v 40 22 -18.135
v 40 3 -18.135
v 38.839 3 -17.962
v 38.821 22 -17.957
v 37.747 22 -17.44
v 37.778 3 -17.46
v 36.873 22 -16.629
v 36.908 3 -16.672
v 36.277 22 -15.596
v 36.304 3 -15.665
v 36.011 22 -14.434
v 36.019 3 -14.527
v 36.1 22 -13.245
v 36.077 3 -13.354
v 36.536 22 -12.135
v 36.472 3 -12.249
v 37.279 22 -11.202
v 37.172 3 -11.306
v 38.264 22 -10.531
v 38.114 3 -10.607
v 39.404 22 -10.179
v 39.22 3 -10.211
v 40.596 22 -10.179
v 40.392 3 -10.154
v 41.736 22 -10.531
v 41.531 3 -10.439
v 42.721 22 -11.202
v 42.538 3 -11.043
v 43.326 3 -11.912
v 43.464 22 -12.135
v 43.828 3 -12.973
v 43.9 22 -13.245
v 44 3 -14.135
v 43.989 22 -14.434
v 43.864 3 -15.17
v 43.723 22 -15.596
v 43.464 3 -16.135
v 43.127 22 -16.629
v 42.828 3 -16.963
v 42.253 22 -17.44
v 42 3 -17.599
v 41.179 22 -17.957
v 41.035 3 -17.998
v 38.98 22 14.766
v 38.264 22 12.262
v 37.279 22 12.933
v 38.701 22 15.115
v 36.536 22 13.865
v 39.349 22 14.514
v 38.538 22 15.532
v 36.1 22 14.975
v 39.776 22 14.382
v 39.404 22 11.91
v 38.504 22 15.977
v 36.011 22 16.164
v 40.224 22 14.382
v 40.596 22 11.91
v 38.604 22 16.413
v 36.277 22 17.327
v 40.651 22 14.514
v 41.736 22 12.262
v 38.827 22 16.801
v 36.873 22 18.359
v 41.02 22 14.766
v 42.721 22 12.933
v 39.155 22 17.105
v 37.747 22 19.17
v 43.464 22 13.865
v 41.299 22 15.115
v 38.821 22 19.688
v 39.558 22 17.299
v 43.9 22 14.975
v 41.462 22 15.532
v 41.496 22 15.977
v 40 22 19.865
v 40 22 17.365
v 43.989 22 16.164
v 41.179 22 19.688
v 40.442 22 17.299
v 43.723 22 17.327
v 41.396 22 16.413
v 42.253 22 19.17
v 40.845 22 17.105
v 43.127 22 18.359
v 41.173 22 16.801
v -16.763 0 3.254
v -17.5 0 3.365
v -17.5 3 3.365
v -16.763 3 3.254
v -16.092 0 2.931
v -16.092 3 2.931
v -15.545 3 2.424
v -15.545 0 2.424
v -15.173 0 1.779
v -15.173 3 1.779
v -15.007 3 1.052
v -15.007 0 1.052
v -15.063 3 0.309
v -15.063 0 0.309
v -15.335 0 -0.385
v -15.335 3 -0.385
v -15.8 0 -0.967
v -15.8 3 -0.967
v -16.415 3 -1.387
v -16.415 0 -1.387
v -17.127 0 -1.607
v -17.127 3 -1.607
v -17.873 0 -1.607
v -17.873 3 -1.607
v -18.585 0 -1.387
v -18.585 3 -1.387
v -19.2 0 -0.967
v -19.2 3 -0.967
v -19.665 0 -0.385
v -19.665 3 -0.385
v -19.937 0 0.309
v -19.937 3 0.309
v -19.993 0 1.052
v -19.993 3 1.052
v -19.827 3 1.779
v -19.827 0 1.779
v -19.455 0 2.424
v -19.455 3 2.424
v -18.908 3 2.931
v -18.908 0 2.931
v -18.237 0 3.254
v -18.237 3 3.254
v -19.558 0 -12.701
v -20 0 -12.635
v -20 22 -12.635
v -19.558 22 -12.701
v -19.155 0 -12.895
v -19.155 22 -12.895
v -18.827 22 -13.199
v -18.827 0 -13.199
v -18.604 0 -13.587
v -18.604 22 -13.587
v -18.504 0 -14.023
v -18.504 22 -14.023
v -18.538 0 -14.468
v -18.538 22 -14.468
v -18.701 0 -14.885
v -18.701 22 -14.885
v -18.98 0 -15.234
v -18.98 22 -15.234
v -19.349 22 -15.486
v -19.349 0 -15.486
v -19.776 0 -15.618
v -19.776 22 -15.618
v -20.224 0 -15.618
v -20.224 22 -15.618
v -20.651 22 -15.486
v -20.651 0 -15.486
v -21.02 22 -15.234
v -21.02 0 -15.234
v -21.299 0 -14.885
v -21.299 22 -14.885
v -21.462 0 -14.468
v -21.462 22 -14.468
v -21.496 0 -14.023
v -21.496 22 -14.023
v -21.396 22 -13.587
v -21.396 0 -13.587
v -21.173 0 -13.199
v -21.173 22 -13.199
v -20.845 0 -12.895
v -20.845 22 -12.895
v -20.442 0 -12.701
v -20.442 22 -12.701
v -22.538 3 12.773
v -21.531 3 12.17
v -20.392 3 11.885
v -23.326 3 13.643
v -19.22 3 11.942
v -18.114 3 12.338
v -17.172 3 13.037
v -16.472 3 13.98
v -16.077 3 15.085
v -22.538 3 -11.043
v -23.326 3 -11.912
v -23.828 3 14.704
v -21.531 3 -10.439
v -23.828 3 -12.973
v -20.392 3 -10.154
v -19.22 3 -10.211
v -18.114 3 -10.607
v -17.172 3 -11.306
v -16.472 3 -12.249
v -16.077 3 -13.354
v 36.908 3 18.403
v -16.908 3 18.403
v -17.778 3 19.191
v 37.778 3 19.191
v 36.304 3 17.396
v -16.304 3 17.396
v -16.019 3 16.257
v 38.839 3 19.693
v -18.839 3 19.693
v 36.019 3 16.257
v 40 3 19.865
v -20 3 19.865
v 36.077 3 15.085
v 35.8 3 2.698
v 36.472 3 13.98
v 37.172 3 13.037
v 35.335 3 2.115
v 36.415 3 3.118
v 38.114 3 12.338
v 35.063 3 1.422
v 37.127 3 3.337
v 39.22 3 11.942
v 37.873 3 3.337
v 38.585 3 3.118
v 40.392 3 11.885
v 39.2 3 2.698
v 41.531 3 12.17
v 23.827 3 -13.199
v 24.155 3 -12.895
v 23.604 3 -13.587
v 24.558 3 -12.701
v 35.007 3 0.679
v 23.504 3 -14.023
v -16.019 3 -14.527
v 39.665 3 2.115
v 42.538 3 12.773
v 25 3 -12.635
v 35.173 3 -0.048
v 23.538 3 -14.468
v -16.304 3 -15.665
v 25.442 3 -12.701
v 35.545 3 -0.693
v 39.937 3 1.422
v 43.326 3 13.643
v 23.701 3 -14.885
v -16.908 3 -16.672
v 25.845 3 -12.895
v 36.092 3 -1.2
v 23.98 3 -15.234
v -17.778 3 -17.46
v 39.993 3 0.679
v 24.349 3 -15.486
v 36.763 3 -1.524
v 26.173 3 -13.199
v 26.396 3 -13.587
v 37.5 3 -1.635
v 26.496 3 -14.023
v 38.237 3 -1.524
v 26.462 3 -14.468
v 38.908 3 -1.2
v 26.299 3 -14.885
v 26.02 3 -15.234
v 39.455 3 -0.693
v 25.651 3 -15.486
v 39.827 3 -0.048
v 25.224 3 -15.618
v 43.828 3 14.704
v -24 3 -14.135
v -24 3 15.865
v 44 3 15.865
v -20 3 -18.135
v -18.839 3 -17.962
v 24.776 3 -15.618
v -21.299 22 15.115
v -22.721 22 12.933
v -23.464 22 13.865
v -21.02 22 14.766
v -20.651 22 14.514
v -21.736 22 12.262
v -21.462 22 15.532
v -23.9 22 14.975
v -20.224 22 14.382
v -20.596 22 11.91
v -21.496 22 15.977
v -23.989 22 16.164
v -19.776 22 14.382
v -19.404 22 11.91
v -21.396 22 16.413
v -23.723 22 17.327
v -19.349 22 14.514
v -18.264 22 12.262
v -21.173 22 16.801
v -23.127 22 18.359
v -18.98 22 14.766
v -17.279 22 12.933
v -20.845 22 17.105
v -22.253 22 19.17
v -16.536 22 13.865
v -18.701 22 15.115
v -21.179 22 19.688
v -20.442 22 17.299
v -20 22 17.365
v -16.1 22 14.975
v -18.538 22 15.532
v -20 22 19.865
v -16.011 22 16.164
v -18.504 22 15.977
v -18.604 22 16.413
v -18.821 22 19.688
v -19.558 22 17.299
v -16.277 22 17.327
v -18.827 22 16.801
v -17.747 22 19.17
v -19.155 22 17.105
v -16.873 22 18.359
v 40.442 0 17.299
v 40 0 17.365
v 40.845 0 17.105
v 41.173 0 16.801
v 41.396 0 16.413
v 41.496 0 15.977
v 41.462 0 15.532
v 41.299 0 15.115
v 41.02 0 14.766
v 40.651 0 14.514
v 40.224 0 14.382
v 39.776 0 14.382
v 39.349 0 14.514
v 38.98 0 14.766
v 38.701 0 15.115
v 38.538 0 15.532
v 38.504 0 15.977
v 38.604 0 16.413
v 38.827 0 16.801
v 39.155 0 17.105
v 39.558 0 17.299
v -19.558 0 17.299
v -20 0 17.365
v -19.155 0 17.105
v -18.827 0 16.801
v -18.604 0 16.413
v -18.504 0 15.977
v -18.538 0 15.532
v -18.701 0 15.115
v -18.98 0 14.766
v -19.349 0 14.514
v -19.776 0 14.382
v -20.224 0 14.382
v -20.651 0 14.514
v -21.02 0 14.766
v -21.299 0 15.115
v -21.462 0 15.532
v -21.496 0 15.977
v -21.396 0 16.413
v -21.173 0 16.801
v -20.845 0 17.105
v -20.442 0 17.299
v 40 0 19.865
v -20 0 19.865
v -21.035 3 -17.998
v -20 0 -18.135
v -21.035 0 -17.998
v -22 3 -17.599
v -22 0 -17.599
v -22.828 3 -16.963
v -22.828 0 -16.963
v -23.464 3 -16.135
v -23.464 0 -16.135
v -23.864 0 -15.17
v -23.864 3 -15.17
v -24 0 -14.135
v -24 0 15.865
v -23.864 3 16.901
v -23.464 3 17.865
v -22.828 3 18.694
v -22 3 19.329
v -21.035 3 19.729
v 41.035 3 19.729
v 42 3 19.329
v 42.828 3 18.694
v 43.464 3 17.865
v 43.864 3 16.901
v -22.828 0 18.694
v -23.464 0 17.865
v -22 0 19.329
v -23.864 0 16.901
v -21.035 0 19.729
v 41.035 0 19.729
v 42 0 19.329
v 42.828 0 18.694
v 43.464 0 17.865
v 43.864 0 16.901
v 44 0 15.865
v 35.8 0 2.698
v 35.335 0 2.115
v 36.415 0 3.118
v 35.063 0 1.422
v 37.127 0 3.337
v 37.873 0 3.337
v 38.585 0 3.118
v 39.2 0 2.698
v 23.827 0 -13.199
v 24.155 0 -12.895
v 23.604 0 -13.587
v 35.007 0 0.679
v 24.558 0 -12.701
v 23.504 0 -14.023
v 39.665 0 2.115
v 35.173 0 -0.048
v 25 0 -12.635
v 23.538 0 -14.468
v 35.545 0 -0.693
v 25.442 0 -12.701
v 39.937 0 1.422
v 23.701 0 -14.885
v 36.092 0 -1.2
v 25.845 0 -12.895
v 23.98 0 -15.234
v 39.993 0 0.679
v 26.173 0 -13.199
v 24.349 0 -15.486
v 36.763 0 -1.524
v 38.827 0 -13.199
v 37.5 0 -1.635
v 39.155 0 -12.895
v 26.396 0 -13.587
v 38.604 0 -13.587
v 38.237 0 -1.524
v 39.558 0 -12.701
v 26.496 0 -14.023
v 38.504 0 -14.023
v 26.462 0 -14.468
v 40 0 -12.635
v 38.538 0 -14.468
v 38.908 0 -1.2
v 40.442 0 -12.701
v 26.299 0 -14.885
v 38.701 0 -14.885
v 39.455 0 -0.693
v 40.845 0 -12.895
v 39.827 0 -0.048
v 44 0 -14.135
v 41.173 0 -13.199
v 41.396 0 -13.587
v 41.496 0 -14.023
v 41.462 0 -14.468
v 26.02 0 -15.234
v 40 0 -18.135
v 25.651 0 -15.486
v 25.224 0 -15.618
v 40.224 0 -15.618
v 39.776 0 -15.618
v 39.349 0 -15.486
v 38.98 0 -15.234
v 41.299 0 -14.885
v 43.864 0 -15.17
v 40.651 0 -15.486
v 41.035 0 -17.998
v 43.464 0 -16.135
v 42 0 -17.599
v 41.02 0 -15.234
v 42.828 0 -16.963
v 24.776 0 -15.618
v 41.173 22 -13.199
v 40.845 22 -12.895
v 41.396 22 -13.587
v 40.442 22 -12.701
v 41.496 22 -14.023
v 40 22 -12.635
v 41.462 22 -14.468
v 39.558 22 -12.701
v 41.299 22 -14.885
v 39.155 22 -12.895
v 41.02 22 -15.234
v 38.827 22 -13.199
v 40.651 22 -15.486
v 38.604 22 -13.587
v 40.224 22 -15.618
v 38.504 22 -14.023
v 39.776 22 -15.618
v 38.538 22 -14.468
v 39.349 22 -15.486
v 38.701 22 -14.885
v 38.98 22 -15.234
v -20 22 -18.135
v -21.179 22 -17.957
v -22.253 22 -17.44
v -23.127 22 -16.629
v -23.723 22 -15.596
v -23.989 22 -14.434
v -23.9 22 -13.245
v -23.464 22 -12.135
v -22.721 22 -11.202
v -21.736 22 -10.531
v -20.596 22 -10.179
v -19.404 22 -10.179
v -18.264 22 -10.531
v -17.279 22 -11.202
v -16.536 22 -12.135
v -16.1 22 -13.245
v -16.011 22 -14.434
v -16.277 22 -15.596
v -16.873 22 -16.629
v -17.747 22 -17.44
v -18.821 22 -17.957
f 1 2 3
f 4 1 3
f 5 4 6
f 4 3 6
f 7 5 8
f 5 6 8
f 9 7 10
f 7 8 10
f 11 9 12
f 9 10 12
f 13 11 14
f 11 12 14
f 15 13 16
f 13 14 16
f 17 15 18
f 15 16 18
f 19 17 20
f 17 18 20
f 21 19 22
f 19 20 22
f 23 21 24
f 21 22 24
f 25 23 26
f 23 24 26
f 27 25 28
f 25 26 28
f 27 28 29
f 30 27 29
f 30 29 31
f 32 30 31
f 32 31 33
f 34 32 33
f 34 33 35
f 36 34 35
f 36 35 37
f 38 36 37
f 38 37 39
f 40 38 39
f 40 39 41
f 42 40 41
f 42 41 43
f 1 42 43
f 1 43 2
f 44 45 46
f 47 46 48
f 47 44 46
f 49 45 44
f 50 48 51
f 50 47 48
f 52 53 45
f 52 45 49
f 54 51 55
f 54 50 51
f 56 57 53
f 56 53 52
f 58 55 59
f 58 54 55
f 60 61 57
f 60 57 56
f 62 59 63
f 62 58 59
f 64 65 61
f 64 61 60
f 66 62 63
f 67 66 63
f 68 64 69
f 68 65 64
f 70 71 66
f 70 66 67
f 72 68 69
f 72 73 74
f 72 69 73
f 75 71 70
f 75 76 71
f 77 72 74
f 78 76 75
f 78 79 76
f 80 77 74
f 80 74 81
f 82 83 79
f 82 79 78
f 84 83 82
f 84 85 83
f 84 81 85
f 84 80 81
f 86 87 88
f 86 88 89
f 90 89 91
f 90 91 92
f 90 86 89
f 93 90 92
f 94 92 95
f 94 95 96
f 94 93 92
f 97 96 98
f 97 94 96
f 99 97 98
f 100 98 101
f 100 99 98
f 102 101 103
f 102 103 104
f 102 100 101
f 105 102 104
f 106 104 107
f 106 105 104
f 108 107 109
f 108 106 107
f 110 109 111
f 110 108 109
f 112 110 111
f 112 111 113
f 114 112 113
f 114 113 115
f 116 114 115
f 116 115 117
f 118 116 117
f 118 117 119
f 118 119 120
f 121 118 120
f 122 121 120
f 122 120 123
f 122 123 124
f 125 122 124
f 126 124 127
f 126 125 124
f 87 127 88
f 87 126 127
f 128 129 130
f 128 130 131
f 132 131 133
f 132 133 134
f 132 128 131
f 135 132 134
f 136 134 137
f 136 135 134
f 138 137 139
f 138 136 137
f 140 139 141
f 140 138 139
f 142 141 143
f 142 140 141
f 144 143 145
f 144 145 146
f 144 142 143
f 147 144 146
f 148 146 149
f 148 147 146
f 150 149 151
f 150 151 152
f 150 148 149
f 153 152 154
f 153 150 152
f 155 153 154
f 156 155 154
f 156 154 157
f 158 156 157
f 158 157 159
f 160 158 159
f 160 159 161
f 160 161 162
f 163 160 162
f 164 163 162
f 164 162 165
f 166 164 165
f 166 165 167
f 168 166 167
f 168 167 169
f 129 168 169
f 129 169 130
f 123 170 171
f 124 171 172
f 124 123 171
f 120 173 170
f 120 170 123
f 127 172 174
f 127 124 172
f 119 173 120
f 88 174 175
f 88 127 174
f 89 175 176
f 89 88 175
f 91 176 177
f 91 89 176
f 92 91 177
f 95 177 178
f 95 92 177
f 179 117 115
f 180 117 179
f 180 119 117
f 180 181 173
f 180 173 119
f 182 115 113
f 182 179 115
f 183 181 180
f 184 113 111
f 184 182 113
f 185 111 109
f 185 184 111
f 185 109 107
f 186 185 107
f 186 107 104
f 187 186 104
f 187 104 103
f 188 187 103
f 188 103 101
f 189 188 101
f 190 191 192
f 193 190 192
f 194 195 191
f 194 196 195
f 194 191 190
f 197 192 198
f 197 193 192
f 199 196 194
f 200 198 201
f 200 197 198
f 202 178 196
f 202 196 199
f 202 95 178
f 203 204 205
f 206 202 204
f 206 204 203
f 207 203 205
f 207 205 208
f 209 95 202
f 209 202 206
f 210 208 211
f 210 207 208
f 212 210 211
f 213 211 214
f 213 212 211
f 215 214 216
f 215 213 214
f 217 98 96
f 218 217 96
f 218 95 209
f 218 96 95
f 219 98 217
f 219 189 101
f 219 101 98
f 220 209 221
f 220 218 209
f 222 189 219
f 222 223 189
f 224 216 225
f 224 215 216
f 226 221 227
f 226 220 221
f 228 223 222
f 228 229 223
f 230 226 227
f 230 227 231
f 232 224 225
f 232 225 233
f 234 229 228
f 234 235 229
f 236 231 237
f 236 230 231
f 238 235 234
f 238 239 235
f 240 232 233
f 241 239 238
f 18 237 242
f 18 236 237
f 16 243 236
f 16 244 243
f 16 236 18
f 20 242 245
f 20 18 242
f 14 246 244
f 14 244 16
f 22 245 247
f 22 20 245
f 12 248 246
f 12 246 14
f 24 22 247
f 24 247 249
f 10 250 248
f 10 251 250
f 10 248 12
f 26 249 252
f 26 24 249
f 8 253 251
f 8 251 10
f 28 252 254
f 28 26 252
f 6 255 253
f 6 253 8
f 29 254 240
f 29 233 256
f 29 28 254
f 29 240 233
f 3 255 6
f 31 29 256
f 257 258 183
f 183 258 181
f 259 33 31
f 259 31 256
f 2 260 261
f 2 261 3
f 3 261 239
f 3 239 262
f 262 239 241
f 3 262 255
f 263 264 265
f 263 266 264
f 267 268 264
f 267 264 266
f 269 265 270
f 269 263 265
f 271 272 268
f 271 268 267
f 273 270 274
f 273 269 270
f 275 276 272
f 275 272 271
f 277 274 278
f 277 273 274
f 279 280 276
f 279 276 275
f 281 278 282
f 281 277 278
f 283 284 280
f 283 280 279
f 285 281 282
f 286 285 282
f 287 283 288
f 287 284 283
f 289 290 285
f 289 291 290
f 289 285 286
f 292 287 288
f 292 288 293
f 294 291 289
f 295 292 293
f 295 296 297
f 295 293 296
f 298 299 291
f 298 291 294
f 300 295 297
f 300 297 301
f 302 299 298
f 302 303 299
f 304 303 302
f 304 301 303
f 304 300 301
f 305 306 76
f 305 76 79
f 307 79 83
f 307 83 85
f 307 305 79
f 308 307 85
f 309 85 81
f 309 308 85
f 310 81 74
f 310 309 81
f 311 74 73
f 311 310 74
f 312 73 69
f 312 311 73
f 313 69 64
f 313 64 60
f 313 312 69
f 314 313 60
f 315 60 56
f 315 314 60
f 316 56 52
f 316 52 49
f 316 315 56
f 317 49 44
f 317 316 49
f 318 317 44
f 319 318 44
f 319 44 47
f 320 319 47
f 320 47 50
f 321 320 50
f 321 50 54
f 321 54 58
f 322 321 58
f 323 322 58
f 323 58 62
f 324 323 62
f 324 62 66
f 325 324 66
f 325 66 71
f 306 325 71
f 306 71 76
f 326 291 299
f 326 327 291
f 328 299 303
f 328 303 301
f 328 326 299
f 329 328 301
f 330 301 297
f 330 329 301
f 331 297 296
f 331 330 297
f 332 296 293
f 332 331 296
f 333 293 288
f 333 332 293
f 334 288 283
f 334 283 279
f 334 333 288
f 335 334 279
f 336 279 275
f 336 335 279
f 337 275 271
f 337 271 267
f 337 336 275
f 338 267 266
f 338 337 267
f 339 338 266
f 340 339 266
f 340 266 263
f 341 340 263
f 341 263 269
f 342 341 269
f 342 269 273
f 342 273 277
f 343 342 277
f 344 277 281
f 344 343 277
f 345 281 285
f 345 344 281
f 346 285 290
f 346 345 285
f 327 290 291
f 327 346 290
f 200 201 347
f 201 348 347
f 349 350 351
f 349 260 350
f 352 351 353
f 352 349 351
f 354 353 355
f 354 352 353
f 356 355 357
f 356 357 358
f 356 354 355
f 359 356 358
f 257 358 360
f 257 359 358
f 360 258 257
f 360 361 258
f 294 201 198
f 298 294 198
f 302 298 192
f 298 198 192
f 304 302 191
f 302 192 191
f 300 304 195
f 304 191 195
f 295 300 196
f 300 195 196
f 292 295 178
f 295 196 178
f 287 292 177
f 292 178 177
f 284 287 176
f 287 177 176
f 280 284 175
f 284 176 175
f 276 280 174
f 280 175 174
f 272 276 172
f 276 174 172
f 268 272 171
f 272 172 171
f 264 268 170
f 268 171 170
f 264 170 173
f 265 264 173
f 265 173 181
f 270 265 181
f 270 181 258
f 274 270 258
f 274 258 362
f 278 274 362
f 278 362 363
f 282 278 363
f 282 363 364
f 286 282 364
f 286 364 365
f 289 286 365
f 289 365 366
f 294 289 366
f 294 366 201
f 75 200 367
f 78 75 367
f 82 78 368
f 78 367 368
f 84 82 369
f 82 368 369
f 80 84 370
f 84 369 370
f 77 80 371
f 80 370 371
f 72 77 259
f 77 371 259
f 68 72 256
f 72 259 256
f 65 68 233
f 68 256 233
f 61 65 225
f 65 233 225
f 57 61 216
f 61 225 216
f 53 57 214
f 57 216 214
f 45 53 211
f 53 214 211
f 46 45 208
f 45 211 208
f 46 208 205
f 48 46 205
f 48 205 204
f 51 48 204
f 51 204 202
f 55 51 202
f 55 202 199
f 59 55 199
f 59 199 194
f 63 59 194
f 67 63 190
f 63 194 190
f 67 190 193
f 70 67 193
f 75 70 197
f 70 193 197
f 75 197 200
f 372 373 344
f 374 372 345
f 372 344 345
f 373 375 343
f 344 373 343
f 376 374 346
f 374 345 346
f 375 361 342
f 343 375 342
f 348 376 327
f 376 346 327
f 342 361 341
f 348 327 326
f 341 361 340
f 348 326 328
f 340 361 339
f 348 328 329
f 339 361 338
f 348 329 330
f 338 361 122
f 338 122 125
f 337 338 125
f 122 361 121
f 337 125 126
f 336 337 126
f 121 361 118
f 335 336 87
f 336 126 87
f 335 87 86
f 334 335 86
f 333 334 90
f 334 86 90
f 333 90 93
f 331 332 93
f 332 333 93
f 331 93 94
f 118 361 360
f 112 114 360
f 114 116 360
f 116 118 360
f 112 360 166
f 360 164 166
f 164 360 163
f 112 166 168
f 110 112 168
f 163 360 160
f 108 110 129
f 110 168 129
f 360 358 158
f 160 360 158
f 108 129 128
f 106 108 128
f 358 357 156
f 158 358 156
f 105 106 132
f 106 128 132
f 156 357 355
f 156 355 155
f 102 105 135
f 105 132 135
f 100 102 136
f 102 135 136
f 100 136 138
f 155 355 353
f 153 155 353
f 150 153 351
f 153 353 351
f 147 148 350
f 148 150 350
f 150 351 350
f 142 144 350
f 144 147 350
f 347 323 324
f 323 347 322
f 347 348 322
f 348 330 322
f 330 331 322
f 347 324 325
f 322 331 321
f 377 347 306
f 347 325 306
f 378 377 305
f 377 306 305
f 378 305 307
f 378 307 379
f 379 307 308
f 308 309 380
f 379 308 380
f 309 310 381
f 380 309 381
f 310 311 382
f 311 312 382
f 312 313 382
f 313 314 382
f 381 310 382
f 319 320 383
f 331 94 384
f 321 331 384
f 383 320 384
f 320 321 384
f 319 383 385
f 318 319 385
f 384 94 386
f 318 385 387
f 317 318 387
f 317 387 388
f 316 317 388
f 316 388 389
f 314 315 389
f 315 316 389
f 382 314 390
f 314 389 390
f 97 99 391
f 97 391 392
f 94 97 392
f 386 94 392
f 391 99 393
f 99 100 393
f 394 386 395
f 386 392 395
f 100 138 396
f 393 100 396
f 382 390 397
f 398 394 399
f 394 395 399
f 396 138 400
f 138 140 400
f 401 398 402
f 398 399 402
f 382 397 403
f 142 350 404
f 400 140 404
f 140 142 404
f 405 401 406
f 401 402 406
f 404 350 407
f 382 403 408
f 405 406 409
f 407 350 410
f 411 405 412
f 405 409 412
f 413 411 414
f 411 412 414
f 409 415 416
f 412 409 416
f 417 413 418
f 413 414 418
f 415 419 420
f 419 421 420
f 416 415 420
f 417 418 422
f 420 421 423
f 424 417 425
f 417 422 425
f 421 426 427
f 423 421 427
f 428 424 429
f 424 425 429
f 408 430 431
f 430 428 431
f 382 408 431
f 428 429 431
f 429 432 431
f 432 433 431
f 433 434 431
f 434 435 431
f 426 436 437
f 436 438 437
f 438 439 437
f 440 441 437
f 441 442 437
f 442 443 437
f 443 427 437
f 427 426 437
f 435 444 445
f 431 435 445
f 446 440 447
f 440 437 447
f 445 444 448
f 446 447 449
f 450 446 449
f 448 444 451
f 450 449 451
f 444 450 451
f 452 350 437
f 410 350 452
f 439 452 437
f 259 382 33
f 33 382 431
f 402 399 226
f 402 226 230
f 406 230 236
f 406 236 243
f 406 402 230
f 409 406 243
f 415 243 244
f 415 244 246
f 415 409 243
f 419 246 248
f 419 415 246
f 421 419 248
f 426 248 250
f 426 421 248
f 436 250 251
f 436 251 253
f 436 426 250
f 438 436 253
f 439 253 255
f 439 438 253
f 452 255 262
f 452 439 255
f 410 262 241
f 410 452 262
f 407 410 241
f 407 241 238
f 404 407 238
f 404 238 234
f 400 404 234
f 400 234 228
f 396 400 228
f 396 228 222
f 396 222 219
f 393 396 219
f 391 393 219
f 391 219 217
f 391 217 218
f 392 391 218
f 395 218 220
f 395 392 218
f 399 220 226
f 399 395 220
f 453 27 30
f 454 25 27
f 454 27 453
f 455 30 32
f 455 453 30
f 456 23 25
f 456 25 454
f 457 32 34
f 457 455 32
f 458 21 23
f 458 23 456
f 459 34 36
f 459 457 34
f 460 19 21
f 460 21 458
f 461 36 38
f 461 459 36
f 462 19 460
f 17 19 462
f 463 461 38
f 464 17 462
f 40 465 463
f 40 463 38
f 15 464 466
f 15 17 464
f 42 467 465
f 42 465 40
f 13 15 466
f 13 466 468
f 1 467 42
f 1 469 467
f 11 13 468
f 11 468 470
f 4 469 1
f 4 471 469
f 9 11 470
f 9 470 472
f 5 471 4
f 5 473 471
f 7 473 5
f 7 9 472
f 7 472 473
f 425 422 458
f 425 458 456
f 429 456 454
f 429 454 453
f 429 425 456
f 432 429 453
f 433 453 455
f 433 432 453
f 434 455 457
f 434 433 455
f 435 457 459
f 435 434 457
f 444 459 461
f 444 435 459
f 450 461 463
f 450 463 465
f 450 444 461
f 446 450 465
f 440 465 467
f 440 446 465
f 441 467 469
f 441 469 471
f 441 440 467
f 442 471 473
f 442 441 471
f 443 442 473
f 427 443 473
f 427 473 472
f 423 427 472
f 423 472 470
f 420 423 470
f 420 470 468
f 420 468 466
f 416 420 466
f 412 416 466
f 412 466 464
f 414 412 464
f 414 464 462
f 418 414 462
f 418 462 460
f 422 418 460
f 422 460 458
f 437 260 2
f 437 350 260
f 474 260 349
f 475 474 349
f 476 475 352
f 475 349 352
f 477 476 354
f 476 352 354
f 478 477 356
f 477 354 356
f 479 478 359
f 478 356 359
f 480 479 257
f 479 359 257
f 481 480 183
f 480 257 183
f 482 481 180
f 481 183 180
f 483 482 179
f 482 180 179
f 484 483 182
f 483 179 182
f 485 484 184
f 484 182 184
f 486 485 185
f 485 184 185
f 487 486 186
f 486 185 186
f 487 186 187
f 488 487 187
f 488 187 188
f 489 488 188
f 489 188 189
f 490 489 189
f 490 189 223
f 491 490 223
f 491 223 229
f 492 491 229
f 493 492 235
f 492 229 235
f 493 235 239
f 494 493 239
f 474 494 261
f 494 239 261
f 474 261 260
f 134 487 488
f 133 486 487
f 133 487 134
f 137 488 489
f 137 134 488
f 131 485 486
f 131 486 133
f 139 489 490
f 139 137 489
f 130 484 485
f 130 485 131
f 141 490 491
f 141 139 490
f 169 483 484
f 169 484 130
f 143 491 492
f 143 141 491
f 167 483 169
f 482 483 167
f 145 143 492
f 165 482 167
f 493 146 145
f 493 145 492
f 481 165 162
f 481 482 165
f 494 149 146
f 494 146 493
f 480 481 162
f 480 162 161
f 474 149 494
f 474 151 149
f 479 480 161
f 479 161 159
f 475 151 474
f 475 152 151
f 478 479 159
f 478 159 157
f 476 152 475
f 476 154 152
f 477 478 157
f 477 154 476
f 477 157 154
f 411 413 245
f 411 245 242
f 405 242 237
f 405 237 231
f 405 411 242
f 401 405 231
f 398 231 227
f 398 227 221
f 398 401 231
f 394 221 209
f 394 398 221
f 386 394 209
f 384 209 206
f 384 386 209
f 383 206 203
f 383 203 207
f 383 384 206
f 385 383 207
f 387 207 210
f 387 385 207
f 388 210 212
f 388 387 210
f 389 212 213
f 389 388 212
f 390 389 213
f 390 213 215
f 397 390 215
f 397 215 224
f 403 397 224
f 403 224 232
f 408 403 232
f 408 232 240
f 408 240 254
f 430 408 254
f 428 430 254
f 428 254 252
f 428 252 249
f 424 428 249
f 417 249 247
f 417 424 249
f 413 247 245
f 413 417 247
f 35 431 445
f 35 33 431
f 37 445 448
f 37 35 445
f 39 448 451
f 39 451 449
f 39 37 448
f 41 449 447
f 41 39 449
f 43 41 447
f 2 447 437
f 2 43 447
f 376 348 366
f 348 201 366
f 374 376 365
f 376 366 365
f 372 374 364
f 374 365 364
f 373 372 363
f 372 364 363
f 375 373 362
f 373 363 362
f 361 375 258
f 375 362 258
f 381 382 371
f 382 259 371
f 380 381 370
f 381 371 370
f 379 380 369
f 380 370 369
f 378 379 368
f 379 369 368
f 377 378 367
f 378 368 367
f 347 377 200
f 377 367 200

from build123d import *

# Parameters (mm, degrees)
SKETCH_1_W      = 68
SKETCH_1_H      = 38
SKETCH_1_R      = 1.5
SKETCH_1_R_2    = 2.5
EXTRUDE_1_DEPTH = 3
SKETCH_2_R      = 4
SKETCH_2_R_2    = 1.5
EXTRUDE_2_DEPTH = 19
FILLET_1_R      = 4


with BuildPart() as part:
    # 草图1 → 凸台-拉伸1 (new body)
    with BuildSketch(Plane(origin=(0, 0, 0), x_dir=(1, 0, 0), z_dir=(0, 1, 0))):
        with Locations((10, -0.865384615)):
            Rectangle(SKETCH_1_W, SKETCH_1_H)
        with Locations(Location((-20, -15.865384615, 0), (0, 0, 270))):
            Circle(SKETCH_1_R, mode=Mode.SUBTRACT)
        with Locations(Location((-20, 14.134615385, 0), (0, 0, 270))):
            Circle(SKETCH_1_R, mode=Mode.SUBTRACT)
        with Locations(Location((40, 14.134615385, 0), (0, 0, 270))):
            Circle(SKETCH_1_R, mode=Mode.SUBTRACT)
        with Locations(Location((40, -15.865384615, 0), (0, 0, 270))):
            Circle(SKETCH_1_R, mode=Mode.SUBTRACT)
        with Locations(Location((-17.5, -0.865384615, 0), (0, 0, 270))):
            Circle(SKETCH_1_R_2, mode=Mode.SUBTRACT)
        with Locations(Location((37.5, -0.865384615, 0), (0, 0, 90))):
            Circle(SKETCH_1_R_2, mode=Mode.SUBTRACT)
        with Locations(Location((25, 14.134615385, 0), (0, 0, 270))):
            Circle(SKETCH_1_R, mode=Mode.SUBTRACT)
    extrude(amount=EXTRUDE_1_DEPTH)

    # 草图2 → 凸台-拉伸2 (add)
    # profile 1 of 4: a face of its own
    with BuildSketch(Plane(origin=(0, 3, 0), x_dir=(1, 0, 0), z_dir=(0, 1, 0))):
        with Locations(Location((-20, -15.865384615, 0), (0, 0, 270))):
            Circle(SKETCH_2_R)
        with Locations(Location((-20, -15.865384615, 0), (0, 0, 270))):
            Circle(SKETCH_2_R_2, mode=Mode.SUBTRACT)
    # profile 2 of 4: a face of its own
    with BuildSketch(Plane(origin=(0, 3, 0), x_dir=(1, 0, 0), z_dir=(0, 1, 0))):
        with Locations(Location((40, -15.865384615, 0), (0, 0, 270))):
            Circle(SKETCH_2_R)
        with Locations(Location((40, -15.865384615, 0), (0, 0, 270))):
            Circle(SKETCH_2_R_2, mode=Mode.SUBTRACT)
    # profile 3 of 4: a face of its own
    with BuildSketch(Plane(origin=(0, 3, 0), x_dir=(1, 0, 0), z_dir=(0, 1, 0))):
        with Locations(Location((-20, 14.134615385, 0), (0, 0, 90))):
            Circle(SKETCH_2_R)
        with Locations(Location((-20, 14.134615385, 0), (0, 0, 270))):
            Circle(SKETCH_2_R_2, mode=Mode.SUBTRACT)
    # profile 4 of 4: a face of its own
    with BuildSketch(Plane(origin=(0, 3, 0), x_dir=(1, 0, 0), z_dir=(0, 1, 0))):
        with Locations(Location((40, 14.134615385, 0), (0, 0, 90))):
            Circle(SKETCH_2_R)
        with Locations(Location((40, 14.134615385, 0), (0, 0, 270))):
            Circle(SKETCH_2_R_2, mode=Mode.SUBTRACT)
    extrude(amount=EXTRUDE_2_DEPTH)

    # 圆角1
    fillet_1_edges = [part.edges().sort_by_distance(p)[0] for p in [
        (44, 1.5, 19.865384615),
        (44, 1.5, -18.134615385),
        (-24, 1.5, -18.134615385),
        (-24, 1.5, 19.865384615),
    ]]
    fillet(fillet_1_edges, radius=FILLET_1_R - 0.0001)  # a hair under: the kernel refuses the full size


solid = part.part
